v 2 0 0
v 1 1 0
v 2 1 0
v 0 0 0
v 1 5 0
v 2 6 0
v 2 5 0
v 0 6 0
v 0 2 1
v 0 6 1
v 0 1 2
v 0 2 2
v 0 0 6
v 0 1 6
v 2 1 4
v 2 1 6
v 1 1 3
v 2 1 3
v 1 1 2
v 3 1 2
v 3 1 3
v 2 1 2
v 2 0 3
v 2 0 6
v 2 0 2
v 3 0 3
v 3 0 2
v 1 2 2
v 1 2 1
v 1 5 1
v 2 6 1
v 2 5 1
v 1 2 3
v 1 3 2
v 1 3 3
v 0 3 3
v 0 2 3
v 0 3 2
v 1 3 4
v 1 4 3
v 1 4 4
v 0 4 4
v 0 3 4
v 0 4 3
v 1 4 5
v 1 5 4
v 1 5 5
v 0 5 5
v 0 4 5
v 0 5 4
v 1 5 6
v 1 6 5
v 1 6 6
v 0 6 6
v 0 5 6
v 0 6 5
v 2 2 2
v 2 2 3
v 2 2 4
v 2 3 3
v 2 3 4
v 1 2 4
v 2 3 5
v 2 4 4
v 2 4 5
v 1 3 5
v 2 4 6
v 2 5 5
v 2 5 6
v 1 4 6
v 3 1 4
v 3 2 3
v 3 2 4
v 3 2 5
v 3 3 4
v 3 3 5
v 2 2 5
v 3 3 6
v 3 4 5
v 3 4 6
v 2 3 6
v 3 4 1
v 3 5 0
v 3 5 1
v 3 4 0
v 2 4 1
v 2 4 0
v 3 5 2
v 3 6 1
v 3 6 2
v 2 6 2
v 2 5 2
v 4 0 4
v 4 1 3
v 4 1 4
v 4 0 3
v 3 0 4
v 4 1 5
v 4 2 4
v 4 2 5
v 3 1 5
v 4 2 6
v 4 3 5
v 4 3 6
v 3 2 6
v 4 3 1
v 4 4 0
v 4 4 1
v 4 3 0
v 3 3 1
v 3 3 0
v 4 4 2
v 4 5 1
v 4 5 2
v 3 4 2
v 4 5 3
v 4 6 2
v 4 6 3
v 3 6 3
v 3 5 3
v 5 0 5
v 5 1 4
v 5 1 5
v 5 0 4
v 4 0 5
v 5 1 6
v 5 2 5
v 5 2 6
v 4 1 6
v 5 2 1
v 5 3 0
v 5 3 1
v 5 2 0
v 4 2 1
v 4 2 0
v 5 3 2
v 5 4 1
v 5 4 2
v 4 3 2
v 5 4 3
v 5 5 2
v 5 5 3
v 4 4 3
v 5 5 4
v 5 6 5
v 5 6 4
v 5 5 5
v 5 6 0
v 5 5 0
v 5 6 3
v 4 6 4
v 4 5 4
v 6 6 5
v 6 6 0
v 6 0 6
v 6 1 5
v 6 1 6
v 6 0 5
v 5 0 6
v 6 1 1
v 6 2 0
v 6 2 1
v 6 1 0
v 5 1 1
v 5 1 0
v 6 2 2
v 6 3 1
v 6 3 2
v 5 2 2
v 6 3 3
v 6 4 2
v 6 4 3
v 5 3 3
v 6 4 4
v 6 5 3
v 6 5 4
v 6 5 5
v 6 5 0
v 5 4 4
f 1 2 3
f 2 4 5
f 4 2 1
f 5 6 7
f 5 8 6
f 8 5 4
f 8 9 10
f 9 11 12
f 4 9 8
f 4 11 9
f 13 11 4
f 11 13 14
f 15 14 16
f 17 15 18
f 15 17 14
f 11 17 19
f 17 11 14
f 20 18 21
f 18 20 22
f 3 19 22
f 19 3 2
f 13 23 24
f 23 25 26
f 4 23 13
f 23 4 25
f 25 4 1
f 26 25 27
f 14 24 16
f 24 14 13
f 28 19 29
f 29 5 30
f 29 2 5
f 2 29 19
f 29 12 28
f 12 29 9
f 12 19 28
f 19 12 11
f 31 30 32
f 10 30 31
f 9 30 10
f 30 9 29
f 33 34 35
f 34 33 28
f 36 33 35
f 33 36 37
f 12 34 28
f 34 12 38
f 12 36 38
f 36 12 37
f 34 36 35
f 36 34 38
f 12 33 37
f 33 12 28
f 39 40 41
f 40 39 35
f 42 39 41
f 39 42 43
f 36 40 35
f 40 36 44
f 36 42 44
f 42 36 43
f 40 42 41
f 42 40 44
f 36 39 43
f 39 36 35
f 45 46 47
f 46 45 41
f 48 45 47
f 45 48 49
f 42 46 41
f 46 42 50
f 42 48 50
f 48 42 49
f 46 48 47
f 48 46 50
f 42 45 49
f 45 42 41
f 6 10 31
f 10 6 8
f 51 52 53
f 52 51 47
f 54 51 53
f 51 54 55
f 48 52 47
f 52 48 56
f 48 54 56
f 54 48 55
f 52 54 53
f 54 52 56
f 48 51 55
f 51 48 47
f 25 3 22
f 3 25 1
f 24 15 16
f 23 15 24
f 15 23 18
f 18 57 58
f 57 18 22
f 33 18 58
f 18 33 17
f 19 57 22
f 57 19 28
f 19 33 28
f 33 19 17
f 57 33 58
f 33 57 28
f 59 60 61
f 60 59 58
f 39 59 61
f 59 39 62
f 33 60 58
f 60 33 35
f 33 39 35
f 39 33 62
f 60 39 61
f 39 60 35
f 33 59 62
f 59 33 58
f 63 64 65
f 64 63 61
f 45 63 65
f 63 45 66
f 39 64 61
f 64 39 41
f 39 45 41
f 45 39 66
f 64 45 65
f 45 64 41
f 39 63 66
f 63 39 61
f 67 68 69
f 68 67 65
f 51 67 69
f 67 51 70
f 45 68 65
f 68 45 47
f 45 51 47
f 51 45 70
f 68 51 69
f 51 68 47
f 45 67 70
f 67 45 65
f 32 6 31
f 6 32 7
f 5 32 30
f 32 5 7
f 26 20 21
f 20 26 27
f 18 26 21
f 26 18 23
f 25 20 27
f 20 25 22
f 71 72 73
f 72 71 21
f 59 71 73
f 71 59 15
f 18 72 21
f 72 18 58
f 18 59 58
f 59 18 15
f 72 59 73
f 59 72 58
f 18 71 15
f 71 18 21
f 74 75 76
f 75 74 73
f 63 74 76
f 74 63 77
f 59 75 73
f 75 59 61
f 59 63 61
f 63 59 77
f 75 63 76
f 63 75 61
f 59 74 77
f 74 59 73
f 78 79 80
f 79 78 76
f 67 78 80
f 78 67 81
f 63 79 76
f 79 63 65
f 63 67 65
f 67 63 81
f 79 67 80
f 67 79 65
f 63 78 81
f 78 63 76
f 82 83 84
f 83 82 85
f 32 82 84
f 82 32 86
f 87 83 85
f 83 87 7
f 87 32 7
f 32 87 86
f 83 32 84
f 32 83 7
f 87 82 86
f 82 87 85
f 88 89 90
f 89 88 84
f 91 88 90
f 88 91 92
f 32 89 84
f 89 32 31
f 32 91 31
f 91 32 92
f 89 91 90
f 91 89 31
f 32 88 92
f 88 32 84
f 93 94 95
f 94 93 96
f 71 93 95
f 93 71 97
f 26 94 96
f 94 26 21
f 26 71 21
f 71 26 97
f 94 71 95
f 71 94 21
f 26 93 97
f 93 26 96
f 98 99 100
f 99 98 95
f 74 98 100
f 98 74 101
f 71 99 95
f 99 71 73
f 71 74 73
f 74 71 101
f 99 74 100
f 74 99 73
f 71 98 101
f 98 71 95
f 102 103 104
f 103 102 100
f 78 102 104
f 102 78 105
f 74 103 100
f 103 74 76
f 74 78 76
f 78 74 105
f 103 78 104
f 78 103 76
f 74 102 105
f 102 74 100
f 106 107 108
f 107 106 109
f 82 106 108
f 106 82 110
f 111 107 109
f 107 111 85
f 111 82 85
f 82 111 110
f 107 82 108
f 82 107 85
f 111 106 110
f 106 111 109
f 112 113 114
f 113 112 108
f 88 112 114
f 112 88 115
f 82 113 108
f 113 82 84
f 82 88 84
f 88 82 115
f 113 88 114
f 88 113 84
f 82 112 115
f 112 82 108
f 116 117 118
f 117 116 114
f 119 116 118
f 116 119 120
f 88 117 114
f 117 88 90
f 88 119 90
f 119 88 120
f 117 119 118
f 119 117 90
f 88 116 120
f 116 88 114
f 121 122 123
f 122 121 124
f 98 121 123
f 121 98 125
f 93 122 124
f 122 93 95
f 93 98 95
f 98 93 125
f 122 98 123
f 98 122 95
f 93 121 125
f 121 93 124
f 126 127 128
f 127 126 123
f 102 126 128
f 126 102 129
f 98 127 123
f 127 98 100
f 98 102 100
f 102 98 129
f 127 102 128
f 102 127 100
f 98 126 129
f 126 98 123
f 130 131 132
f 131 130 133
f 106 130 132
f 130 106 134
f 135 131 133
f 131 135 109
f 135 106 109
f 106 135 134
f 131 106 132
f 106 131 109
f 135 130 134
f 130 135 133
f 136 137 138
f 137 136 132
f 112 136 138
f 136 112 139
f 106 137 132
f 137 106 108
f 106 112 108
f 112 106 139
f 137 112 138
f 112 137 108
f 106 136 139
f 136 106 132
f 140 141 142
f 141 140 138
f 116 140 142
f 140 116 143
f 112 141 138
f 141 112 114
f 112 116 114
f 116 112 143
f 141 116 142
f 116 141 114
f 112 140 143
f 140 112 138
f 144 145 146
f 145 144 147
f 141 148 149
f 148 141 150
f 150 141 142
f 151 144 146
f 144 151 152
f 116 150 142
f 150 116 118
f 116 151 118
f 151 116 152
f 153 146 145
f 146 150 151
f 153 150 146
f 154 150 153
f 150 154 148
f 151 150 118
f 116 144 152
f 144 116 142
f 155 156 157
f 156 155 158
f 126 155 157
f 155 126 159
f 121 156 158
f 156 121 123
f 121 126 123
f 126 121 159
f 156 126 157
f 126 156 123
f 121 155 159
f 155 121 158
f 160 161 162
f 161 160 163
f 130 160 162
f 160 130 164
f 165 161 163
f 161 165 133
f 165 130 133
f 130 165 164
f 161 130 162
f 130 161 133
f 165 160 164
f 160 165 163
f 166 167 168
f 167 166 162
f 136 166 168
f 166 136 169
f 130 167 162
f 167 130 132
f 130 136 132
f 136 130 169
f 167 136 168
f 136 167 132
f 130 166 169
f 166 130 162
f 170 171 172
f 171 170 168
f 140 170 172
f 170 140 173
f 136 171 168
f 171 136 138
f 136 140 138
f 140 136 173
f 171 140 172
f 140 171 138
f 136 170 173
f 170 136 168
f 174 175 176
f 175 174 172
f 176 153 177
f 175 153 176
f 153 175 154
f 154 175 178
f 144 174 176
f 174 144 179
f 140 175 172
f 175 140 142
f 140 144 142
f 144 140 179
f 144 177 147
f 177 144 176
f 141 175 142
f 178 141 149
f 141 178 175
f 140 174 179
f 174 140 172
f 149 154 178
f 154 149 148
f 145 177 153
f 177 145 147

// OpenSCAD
union() {
    translate([0, 0, 0]) cube([1, 1, 1]);
    translate([0, 0, 1]) cube([1, 1, 1]);
    translate([0, 0, 2]) cube([1, 1, 1]);
    translate([0, 0, 3]) cube([1, 1, 1]);
    translate([0, 0, 4]) cube([1, 1, 1]);
    translate([0, 0, 5]) cube([1, 1, 1]);
    translate([0, 1, 0]) cube([1, 1, 1]);
    translate([0, 1, 1]) cube([1, 1, 1]);
    translate([0, 2, 0]) cube([1, 1, 1]);
    translate([0, 2, 2]) cube([1, 1, 1]);
    translate([0, 3, 0]) cube([1, 1, 1]);
    translate([0, 3, 3]) cube([1, 1, 1]);
    translate([0, 4, 0]) cube([1, 1, 1]);
    translate([0, 4, 4]) cube([1, 1, 1]);
    translate([0, 5, 0]) cube([1, 1, 1]);
    translate([0, 5, 5]) cube([1, 1, 1]);
    translate([1, 0, 0]) cube([1, 1, 1]);
    translate([1, 0, 1]) cube([1, 1, 1]);
    translate([1, 0, 2]) cube([1, 1, 1]);
    translate([1, 0, 3]) cube([1, 1, 1]);
    translate([1, 0, 4]) cube([1, 1, 1]);
    translate([1, 0, 5]) cube([1, 1, 1]);
    translate([1, 1, 2]) cube([1, 1, 1]);
    translate([1, 2, 3]) cube([1, 1, 1]);
    translate([1, 3, 4]) cube([1, 1, 1]);
    translate([1, 4, 5]) cube([1, 1, 1]);
    translate([1, 5, 0]) cube([1, 1, 1]);
    translate([2, 0, 2]) cube([1, 1, 1]);
    translate([2, 1, 3]) cube([1, 1, 1]);
    translate([2, 2, 4]) cube([1, 1, 1]);
    translate([2, 3, 5]) cube([1, 1, 1]);
    translate([2, 4, 0]) cube([1, 1, 1]);
    translate([2, 5, 1]) cube([1, 1, 1]);
    translate([3, 0, 3]) cube([1, 1, 1]);
    translate([3, 1, 4]) cube([1, 1, 1]);
    translate([3, 2, 5]) cube([1, 1, 1]);
    translate([3, 3, 0]) cube([1, 1, 1]);
    translate([3, 4, 1]) cube([1, 1, 1]);
    translate([3, 5, 2]) cube([1, 1, 1]);
    translate([4, 0, 4]) cube([1, 1, 1]);
    translate([4, 1, 5]) cube([1, 1, 1]);
    translate([4, 2, 0]) cube([1, 1, 1]);
    translate([4, 3, 1]) cube([1, 1, 1]);
    translate([4, 4, 2]) cube([1, 1, 1]);
    translate([4, 5, 3]) cube([1, 1, 1]);
    translate([5, 0, 5]) cube([1, 1, 1]);
    translate([5, 1, 0]) cube([1, 1, 1]);
    translate([5, 2, 1]) cube([1, 1, 1]);
    translate([5, 3, 2]) cube([1, 1, 1]);
    translate([5, 4, 3]) cube([1, 1, 1]);
    translate([5, 5, 0]) cube([1, 1, 1]);
    translate([5, 5, 1]) cube([1, 1, 1]);
    translate([5, 5, 2]) cube([1, 1, 1]);
    translate([5, 5, 3]) cube([1, 1, 1]);
    translate([5, 5, 4]) cube([1, 1, 1]);
}
